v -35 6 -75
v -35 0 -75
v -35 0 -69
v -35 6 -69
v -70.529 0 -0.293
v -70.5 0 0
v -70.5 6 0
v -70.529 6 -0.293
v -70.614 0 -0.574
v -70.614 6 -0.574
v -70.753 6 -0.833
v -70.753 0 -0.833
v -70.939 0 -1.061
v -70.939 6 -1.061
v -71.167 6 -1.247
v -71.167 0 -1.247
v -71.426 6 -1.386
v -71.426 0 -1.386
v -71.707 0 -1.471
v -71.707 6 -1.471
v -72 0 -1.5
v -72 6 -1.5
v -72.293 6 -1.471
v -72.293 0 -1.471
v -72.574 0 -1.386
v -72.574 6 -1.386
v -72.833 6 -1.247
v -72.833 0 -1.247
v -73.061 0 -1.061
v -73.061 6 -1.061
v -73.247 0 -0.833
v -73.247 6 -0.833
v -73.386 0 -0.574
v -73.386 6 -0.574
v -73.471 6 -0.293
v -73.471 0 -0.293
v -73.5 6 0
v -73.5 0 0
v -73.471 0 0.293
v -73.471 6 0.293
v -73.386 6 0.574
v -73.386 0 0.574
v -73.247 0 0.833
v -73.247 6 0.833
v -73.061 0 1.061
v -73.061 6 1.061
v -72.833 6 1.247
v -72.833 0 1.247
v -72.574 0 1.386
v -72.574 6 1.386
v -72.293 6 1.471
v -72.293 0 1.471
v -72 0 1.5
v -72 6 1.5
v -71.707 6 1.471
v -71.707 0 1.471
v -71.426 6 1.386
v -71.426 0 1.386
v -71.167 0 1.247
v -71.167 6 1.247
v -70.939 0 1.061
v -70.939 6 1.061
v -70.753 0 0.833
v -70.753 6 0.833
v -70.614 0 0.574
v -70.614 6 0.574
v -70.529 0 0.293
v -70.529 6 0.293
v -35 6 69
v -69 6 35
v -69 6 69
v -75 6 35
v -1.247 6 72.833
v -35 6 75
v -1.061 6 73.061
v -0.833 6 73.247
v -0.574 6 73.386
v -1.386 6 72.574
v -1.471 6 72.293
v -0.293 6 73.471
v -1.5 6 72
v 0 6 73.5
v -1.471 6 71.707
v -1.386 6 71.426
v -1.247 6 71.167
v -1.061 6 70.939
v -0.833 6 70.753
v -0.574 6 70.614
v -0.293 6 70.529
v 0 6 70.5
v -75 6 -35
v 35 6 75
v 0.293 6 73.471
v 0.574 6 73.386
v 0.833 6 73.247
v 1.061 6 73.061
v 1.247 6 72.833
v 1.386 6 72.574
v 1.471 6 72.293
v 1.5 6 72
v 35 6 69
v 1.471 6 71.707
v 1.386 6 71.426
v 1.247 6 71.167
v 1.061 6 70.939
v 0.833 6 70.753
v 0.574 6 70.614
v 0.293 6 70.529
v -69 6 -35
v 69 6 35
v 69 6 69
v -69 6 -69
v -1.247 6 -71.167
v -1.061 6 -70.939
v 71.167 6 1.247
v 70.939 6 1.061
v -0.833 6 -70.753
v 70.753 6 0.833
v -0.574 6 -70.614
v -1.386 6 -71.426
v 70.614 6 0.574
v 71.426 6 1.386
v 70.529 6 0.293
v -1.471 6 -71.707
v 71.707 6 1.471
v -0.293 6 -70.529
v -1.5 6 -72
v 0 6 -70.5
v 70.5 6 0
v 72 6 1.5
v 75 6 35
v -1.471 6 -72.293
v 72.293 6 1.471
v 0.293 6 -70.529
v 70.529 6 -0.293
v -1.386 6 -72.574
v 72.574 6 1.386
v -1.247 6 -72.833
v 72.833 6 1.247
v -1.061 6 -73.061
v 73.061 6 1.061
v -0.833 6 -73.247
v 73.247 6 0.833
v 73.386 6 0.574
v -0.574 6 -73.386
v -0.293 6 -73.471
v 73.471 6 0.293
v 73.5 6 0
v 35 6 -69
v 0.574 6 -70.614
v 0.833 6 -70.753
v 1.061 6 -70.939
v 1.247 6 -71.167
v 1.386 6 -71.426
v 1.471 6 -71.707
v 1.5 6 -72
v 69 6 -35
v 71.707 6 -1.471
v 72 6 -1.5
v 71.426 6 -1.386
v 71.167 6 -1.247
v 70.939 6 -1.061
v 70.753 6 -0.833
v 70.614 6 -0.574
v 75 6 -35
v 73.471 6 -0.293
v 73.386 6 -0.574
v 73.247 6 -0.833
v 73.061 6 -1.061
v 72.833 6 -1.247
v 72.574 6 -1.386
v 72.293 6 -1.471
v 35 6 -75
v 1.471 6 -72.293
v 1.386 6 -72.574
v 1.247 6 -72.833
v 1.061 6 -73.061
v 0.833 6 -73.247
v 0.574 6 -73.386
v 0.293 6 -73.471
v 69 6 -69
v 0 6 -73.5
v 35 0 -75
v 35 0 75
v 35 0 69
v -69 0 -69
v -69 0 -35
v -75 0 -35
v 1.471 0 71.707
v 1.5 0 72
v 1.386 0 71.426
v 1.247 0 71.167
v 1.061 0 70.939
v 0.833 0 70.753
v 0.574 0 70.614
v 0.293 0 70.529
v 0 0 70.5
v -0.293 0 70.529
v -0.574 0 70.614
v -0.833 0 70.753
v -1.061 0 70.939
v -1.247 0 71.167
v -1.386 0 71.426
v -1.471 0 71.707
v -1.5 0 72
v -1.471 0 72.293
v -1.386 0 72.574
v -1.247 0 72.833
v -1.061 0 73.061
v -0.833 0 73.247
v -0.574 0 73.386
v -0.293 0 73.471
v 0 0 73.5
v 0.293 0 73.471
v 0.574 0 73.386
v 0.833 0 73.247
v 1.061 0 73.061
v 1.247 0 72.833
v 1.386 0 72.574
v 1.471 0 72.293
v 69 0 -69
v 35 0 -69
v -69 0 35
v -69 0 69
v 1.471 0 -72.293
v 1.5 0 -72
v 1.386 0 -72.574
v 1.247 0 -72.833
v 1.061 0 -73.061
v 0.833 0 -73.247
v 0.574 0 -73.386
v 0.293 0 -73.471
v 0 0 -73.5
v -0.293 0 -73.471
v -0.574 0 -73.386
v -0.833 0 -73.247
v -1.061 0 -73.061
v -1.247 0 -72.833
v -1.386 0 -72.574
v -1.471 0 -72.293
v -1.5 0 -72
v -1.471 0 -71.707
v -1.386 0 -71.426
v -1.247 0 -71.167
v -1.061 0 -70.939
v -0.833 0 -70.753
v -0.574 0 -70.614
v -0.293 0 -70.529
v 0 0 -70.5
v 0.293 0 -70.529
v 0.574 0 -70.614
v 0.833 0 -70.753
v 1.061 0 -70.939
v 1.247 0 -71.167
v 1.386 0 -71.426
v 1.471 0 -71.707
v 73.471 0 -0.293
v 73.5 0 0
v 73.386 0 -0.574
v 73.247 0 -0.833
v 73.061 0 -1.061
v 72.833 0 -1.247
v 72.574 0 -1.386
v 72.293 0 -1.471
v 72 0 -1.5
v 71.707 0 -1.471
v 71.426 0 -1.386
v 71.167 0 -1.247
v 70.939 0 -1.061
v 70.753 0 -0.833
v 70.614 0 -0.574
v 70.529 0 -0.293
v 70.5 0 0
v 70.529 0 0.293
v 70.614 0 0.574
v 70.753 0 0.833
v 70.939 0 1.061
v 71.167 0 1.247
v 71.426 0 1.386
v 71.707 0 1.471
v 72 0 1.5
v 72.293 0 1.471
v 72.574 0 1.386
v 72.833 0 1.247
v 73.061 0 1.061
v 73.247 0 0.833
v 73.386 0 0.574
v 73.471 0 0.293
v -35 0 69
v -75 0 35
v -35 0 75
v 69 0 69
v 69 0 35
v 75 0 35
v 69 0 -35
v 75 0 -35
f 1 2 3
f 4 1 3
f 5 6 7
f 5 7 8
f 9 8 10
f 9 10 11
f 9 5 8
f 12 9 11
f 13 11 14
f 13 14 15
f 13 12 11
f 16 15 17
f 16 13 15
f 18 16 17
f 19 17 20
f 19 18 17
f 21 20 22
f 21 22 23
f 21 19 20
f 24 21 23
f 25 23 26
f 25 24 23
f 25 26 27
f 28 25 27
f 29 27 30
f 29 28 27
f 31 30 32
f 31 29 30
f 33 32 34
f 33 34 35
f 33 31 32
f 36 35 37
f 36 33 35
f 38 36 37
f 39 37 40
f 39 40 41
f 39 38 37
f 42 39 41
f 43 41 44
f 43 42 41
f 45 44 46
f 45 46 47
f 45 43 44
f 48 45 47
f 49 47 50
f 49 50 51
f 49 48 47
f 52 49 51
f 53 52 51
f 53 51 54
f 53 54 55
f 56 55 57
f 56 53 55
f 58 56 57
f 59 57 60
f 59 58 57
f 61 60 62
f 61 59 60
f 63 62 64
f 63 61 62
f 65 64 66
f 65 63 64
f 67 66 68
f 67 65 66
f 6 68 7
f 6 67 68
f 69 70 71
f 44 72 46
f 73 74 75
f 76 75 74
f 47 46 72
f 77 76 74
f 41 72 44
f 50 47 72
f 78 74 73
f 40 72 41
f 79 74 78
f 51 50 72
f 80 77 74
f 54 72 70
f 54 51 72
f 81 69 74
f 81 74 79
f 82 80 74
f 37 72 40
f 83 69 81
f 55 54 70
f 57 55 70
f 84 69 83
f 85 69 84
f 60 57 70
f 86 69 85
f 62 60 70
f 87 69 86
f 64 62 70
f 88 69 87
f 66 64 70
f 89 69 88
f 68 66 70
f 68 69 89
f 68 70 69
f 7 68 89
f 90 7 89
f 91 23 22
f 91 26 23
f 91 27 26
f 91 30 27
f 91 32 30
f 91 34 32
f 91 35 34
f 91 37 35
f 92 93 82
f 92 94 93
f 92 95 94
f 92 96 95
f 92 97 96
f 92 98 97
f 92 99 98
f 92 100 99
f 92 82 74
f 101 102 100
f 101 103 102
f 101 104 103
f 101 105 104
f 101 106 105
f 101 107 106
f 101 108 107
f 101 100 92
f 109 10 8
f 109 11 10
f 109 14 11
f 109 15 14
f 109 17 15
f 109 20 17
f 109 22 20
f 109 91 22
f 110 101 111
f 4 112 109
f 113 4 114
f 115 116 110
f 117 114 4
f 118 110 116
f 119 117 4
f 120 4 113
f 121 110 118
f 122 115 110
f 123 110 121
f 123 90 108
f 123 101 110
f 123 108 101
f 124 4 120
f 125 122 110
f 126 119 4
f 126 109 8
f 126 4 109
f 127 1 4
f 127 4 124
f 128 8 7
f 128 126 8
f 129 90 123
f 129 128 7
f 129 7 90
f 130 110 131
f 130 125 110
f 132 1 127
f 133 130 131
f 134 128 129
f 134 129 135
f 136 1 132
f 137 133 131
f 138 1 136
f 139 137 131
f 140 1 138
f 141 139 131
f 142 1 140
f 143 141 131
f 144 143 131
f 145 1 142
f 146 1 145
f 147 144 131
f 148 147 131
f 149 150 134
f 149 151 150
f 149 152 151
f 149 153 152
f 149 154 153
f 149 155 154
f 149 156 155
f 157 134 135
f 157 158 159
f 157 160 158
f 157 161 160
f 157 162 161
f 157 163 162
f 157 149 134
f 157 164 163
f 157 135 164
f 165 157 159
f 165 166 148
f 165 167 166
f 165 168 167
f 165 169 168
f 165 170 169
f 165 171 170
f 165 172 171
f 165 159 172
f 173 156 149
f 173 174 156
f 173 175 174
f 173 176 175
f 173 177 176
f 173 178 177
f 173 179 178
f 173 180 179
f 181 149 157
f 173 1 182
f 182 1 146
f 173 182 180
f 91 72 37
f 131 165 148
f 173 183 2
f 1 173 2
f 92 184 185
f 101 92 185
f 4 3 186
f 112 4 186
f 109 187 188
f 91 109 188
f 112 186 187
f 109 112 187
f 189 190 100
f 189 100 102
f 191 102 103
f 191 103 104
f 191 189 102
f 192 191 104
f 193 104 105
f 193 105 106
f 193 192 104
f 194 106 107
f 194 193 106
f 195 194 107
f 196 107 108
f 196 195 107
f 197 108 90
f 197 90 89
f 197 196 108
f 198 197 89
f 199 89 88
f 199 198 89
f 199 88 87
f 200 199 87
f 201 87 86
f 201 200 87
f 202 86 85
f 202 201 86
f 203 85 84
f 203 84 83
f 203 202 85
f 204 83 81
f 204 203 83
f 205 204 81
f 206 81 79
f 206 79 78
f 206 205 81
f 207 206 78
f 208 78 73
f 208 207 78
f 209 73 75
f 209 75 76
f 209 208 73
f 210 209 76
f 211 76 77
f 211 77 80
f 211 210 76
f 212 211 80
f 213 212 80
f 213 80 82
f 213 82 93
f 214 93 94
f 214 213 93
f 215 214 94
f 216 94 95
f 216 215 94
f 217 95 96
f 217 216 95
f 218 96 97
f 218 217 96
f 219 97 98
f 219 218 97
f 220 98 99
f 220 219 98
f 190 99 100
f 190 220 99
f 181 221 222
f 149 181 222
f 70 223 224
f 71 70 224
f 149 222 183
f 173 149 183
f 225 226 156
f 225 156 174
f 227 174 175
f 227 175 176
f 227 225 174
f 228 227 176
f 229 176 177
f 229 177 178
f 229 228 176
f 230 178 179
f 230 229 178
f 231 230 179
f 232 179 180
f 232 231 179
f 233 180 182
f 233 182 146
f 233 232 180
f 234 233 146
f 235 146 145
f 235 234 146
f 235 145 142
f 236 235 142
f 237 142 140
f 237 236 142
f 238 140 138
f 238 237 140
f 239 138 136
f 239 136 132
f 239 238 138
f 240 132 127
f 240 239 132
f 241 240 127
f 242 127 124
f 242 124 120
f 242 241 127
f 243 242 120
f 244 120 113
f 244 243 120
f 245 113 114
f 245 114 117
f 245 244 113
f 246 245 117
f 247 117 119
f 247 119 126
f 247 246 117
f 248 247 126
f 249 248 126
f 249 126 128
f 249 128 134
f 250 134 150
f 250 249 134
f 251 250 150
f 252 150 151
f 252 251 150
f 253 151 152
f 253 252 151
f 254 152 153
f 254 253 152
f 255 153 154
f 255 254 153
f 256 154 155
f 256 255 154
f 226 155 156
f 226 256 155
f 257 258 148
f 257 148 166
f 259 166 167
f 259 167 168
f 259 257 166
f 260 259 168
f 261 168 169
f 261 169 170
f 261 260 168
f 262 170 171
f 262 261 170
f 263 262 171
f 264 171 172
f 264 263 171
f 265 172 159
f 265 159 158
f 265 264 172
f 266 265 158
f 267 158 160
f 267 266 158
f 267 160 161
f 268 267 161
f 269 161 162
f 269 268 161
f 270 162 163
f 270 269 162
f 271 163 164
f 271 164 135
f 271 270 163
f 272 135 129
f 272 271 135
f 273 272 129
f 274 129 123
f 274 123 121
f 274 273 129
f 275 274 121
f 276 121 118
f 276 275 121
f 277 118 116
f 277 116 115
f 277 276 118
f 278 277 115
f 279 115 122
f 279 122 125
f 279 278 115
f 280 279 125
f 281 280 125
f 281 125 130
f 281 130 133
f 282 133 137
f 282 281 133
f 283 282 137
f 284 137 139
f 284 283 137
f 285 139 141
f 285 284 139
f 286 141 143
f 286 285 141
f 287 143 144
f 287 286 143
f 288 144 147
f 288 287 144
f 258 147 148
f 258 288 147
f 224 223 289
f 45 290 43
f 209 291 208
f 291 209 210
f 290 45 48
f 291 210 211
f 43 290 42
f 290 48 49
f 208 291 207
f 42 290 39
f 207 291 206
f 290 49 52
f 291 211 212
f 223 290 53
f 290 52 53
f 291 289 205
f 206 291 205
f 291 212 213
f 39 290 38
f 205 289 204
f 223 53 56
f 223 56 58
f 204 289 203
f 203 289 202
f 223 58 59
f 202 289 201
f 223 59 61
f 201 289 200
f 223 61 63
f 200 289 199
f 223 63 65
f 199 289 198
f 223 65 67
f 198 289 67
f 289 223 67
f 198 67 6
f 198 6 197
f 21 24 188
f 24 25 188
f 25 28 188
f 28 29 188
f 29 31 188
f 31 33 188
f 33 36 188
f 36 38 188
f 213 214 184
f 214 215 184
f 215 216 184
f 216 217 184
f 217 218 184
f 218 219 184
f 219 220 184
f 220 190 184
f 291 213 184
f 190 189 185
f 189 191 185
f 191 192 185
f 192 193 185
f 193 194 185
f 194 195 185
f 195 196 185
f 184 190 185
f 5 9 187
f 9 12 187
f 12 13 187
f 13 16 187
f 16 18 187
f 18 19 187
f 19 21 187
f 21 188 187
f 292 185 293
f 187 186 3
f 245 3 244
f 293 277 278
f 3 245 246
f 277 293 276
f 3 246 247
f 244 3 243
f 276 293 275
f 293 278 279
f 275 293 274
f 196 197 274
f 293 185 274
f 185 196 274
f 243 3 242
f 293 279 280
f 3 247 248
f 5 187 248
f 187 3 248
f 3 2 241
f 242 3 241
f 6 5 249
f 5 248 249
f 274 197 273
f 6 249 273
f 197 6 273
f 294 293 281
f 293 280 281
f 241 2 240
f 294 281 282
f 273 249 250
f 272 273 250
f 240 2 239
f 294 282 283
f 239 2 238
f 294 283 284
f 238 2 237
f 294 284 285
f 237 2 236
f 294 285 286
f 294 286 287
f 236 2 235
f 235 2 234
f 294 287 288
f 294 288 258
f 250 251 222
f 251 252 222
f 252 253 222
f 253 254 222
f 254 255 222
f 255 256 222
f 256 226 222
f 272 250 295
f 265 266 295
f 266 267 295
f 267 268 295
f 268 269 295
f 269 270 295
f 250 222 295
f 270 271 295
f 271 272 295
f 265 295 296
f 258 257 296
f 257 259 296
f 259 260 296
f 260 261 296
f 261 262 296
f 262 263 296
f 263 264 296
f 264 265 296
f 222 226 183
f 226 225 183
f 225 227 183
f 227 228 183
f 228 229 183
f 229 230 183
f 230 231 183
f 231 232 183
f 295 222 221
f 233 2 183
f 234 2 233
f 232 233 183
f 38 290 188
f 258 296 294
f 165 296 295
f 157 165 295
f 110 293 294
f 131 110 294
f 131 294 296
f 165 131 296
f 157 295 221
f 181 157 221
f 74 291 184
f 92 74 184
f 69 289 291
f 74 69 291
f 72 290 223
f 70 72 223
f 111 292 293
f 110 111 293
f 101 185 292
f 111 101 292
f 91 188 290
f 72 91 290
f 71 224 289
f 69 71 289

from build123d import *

# Parameters (mm, degrees)
SKETCH1_R           = 1.5
BOSS_EXTRUDE1_DEPTH = 6


with BuildPart() as part:
    # Sketch1 → Boss-Extrude1 (new body)
    with BuildSketch(Plane(origin=(0, 0, 0), x_dir=(1, 0, 0), z_dir=(0, 1, 0))):
        Polygon((69, 69), (35, 69), (35, 75), (-35, 75), (-35, 69), (-69, 69), (-69, 35), (-75, 35), (-75, -35), (-69, -35), (-69, -69), (-35, -69), (-35, -75), (35, -75), (35, -69), (69, -69), (69, -35), (75, -35), (75, 35), (69, 35), align=None)
        with Locations((0, 72)):
            Circle(SKETCH1_R, mode=Mode.SUBTRACT)
        with Locations((-72, 0)):
            Circle(SKETCH1_R, mode=Mode.SUBTRACT)
        with Locations((72, 0)):
            Circle(SKETCH1_R, mode=Mode.SUBTRACT)
        with Locations((0, -72)):
            Circle(SKETCH1_R, mode=Mode.SUBTRACT)
    extrude(amount=BOSS_EXTRUDE1_DEPTH)


solid = part.part
